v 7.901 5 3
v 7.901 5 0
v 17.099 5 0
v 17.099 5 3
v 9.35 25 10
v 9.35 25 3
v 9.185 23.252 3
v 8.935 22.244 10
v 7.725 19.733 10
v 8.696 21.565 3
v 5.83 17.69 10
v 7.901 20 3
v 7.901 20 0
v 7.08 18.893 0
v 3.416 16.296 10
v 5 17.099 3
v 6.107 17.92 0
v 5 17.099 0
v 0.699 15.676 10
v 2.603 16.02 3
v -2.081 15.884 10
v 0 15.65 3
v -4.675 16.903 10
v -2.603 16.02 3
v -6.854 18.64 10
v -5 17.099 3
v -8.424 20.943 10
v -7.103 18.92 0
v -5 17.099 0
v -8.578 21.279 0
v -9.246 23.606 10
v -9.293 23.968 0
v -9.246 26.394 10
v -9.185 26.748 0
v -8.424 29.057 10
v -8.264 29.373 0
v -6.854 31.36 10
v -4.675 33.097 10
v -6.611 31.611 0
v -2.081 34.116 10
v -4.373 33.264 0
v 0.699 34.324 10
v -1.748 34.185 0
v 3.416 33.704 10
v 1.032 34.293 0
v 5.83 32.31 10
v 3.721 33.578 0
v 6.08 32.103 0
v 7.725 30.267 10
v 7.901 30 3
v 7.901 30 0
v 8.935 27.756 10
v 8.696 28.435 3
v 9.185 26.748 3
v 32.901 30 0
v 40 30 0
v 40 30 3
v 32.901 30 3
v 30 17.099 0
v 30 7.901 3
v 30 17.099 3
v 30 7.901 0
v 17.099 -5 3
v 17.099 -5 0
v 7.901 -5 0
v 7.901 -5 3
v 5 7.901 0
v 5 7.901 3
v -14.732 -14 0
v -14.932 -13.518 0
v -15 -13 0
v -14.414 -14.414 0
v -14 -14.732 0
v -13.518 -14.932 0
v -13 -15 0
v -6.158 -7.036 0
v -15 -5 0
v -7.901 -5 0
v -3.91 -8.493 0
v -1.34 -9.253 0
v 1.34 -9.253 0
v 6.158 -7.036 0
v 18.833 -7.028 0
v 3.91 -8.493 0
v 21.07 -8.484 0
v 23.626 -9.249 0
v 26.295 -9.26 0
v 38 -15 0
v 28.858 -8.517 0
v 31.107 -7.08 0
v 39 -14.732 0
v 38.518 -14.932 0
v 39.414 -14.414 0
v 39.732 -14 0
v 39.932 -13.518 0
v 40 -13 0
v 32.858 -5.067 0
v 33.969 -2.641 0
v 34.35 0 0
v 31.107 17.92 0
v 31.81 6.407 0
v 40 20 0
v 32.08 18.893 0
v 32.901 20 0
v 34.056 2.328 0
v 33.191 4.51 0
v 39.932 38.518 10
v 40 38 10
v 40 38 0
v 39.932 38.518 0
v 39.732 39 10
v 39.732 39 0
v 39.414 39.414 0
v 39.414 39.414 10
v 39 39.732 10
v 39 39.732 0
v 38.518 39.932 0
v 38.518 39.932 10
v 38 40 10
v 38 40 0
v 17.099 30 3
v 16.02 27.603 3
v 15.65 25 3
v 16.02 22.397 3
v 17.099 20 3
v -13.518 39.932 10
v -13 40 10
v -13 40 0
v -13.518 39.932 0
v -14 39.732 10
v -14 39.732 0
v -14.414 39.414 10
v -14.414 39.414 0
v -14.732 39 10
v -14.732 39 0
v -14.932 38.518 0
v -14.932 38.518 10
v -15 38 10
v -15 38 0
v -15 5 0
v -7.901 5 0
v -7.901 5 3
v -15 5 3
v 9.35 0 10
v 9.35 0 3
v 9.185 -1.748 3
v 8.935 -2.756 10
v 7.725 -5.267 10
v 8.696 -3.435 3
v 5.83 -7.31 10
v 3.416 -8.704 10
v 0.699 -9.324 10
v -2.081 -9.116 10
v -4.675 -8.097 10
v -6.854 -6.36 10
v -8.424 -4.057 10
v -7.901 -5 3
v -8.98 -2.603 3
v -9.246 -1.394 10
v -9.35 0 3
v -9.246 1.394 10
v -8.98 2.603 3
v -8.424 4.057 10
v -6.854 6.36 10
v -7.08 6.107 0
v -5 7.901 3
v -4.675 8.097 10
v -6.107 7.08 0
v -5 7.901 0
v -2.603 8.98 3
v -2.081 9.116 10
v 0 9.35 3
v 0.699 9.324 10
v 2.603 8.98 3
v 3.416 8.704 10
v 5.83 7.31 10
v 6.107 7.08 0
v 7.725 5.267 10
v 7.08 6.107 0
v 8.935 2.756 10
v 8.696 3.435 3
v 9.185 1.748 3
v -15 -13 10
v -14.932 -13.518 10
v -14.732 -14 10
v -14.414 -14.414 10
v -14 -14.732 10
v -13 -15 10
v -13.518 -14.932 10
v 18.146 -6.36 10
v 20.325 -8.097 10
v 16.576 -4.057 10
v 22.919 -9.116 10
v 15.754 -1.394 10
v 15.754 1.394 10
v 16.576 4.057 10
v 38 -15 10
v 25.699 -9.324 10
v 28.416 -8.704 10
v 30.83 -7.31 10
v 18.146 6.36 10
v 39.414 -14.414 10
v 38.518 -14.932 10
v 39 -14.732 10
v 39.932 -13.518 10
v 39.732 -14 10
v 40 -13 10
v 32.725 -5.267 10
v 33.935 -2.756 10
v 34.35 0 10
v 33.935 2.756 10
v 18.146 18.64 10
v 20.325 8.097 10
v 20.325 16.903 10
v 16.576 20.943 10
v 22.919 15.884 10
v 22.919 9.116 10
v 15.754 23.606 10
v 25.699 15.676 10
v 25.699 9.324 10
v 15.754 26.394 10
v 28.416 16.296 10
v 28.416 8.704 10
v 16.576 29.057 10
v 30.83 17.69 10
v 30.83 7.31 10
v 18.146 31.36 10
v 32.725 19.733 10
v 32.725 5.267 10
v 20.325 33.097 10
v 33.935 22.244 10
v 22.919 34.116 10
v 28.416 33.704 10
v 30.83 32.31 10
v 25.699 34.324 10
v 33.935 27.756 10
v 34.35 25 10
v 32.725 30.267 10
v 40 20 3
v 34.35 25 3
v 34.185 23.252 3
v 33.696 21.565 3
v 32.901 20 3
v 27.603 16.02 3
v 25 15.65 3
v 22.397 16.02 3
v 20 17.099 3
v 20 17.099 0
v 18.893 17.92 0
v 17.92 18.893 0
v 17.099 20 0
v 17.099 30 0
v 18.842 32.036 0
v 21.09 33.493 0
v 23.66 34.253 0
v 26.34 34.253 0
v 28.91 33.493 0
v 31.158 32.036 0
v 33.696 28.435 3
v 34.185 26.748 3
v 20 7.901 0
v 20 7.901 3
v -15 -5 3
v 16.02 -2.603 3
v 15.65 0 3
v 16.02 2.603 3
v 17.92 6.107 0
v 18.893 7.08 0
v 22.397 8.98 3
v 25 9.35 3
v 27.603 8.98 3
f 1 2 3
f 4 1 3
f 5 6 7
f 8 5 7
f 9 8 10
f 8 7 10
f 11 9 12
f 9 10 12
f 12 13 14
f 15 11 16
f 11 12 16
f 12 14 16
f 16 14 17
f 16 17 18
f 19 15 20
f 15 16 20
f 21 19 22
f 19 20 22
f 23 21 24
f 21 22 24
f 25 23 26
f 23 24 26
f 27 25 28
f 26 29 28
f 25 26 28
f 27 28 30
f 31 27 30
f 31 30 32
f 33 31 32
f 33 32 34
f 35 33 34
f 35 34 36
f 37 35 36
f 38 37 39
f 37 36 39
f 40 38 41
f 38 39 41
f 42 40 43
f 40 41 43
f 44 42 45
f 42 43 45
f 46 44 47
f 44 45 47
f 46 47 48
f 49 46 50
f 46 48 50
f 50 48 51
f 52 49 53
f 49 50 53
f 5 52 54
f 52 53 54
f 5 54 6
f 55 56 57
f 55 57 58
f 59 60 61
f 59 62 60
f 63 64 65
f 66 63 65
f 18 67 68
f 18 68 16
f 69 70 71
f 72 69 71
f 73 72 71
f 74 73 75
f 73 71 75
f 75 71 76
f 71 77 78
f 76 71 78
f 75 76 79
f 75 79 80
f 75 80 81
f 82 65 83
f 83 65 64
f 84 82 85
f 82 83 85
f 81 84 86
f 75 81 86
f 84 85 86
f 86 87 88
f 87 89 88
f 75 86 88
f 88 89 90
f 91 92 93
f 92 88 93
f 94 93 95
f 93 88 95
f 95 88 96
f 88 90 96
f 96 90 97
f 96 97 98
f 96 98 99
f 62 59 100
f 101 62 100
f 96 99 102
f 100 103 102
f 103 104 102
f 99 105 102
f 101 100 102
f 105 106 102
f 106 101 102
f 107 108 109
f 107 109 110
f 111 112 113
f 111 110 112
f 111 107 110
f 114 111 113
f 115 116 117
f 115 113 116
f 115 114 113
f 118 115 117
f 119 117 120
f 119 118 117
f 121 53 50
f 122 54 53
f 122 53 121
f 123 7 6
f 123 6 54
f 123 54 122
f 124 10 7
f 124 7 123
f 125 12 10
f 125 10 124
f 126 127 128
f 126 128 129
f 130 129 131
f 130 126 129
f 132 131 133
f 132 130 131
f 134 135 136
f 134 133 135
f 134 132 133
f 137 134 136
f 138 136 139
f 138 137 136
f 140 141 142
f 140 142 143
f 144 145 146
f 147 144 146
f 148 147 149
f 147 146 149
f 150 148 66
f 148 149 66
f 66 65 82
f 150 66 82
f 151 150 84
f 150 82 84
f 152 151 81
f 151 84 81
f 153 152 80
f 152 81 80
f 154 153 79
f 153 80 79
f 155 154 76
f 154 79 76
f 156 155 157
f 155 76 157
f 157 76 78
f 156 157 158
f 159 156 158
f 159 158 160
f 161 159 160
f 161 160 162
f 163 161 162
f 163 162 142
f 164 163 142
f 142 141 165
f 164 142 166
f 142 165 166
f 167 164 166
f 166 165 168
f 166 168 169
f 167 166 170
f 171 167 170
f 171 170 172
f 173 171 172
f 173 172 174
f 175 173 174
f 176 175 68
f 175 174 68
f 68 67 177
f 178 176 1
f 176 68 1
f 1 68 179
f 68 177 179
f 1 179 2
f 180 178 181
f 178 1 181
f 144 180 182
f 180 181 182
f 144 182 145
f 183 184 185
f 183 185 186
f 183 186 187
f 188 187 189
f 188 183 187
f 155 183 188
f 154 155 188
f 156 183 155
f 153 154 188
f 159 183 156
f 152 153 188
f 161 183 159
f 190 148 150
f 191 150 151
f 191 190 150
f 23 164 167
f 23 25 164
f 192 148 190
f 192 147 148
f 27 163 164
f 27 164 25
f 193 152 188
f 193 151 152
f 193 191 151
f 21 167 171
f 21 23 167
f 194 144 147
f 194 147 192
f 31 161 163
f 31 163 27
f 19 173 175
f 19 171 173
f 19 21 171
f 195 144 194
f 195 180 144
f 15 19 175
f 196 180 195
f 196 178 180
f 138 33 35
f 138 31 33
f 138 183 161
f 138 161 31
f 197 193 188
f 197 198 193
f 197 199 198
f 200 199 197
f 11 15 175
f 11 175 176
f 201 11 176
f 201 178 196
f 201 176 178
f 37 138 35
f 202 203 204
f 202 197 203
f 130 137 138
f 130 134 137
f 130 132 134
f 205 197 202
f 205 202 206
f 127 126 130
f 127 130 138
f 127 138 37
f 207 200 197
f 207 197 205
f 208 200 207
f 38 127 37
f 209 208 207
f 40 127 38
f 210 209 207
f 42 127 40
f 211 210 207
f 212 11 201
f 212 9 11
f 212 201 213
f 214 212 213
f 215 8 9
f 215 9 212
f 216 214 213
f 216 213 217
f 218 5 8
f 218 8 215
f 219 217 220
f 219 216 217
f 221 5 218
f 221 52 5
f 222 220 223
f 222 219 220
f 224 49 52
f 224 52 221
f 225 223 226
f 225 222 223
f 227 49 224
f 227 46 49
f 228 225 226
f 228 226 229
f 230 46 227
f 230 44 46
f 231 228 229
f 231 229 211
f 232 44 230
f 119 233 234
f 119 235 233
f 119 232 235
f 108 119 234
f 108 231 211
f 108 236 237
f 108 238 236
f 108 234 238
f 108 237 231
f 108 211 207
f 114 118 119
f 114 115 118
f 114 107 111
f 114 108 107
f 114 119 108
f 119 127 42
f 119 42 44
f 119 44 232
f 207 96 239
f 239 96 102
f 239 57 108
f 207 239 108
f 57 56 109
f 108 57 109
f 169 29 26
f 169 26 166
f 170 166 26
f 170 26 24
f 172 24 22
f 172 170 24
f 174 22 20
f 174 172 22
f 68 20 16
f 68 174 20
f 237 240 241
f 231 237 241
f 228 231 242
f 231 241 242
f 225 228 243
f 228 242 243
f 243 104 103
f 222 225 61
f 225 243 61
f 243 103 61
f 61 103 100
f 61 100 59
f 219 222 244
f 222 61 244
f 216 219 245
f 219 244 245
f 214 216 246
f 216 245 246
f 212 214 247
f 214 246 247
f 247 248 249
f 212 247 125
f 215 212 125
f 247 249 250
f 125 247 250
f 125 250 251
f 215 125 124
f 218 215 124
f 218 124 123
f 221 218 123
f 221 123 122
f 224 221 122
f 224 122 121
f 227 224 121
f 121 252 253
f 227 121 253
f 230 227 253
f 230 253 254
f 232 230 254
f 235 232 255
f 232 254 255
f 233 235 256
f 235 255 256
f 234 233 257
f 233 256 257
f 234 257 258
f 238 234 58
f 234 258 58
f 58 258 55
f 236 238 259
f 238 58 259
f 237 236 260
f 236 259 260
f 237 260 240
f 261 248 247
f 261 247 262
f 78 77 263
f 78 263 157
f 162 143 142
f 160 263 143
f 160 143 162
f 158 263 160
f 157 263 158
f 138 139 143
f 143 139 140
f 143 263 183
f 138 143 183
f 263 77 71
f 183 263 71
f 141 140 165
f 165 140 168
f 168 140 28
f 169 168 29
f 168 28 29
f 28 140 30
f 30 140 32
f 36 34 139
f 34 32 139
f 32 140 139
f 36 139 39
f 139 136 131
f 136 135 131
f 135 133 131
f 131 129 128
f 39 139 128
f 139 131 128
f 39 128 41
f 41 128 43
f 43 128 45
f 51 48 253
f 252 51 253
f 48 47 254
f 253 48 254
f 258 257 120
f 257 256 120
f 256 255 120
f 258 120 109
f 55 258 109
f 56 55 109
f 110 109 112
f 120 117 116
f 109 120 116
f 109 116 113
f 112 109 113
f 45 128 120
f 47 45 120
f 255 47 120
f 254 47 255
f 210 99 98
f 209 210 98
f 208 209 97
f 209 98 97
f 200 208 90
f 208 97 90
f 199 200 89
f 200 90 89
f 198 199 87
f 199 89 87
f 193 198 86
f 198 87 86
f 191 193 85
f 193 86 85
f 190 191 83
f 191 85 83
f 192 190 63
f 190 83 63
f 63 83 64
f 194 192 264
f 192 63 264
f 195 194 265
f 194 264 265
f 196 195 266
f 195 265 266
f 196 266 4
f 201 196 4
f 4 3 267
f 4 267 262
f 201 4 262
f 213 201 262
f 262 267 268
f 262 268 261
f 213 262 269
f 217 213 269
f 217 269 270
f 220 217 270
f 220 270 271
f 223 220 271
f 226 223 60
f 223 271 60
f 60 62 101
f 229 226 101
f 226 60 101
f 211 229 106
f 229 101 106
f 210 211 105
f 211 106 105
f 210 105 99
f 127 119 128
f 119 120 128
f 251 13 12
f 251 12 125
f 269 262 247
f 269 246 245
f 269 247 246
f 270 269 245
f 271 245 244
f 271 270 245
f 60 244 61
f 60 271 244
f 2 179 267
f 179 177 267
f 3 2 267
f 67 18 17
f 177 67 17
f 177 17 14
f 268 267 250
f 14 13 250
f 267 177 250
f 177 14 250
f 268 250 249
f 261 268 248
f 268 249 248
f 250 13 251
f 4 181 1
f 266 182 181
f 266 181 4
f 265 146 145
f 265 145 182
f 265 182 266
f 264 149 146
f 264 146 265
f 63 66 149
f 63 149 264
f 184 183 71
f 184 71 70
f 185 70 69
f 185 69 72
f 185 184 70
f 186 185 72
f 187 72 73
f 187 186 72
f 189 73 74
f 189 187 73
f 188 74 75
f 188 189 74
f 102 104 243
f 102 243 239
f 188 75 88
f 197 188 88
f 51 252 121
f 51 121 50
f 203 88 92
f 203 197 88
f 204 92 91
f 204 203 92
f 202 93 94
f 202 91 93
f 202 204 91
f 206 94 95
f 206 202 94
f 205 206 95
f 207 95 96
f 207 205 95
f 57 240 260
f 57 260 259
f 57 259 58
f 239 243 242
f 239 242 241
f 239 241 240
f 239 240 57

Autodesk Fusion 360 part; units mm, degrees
sketch "Sketch1" plane through (0, 0, 0) normal (0, 0, 1) x (1, 0, 0)
  circle A0 centre (0, 0) radius 9.35
  circle A1 centre (25, 0) radius 9.35
  circle A2 centre (0, 25) radius 9.35
  circle A3 centre (25, 25) radius 9.35
  line L0 (-15, -15) -> (40, -15)
  line L1 (40, -15) -> (40, 40)
  line L2 (40, 40) -> (-15, 40)
  line L3 (-15, 40) -> (-15, -15)
  dimension "d1" = 18.7
  dimension "d4" = 25
  dimension "d5" = 25
extrude "Extrude1" add sketch "Sketch1" along normal blind 10
fillet "Fillet1" radius 2 4 edges at (-15, -15, 5) (-15, 40, 5) (40, -15, 5) (40, 40, 5)
sketch "Sketch2" plane through (0, 0, 0) normal (0, 0, -1) x (1, 0, 0)
  circle A0 centre (25, 0) radius 9.35
  circle A1 centre (0, 0) radius 9.35
  circle A2 centre (25, -25) radius 9.35
  circle A3 centre (0, -25) radius 9.35
  arc A4 (38, -40) -> (40, -38) centre (38, -38) ccw
  line L0 (40, -38) -> (40, 13)
  arc A5 (40, 13) -> (38, 15) centre (38, 13) ccw
  line L1 (38, 15) -> (-13, 15)
  arc A6 (-13, 15) -> (-15, 13) centre (-13, 13) ccw
  line L2 (-15, 13) -> (-15, -38)
  arc A7 (-15, -38) -> (-13, -40) centre (-13, -38) ccw
  line L3 (-13, -40) -> (38, -40)
  line L4 (-5, -5) -> (5, -5)
  line L5 (5, -5) -> (5, -20)
  line L6 (5, -20) -> (-5, -20)
  line L7 (-5, -20) -> (-5, -5)
  line L8 (5, -5) -> (20, -5)
  line L9 (20, -5) -> (20, 5)
  line L10 (20, 5) -> (5, 5)
  line L11 (5, 5) -> (5, -5)
  line L12 (20, -5) -> (30, -5)
  line L13 (30, -5) -> (30, -20)
  line L14 (30, -20) -> (20, -20)
  line L15 (20, -20) -> (20, -5)
  line L16 (5, -20) -> (20, -20)
  line L17 (20, -20) -> (20, -30)
  line L18 (20, -30) -> (5, -30)
  line L19 (5, -30) -> (5, -20)
  line L20 (-20, 5) -> (-5, 5)
  line L21 (-5, 5) -> (-5, -5)
  line L22 (-5, -5) -> (-20, -5)
  line L23 (-20, -5) -> (-20, 5)
  line L24 (30, -20) -> (45, -20)
  line L25 (45, -20) -> (45, -30)
  line L26 (45, -30) -> (30, -30)
  line L27 (30, -30) -> (30, -20)
extrude "Extrude2" cut sketch "Sketch2" against normal blind 3 contours A0 A1 L8 L10 | A0 A2 L13 L15 | A1 L2 L20 L22 | A2 L0 L24 L26 | A1 A3 L5 L7 | A2 A3 L16 L18
